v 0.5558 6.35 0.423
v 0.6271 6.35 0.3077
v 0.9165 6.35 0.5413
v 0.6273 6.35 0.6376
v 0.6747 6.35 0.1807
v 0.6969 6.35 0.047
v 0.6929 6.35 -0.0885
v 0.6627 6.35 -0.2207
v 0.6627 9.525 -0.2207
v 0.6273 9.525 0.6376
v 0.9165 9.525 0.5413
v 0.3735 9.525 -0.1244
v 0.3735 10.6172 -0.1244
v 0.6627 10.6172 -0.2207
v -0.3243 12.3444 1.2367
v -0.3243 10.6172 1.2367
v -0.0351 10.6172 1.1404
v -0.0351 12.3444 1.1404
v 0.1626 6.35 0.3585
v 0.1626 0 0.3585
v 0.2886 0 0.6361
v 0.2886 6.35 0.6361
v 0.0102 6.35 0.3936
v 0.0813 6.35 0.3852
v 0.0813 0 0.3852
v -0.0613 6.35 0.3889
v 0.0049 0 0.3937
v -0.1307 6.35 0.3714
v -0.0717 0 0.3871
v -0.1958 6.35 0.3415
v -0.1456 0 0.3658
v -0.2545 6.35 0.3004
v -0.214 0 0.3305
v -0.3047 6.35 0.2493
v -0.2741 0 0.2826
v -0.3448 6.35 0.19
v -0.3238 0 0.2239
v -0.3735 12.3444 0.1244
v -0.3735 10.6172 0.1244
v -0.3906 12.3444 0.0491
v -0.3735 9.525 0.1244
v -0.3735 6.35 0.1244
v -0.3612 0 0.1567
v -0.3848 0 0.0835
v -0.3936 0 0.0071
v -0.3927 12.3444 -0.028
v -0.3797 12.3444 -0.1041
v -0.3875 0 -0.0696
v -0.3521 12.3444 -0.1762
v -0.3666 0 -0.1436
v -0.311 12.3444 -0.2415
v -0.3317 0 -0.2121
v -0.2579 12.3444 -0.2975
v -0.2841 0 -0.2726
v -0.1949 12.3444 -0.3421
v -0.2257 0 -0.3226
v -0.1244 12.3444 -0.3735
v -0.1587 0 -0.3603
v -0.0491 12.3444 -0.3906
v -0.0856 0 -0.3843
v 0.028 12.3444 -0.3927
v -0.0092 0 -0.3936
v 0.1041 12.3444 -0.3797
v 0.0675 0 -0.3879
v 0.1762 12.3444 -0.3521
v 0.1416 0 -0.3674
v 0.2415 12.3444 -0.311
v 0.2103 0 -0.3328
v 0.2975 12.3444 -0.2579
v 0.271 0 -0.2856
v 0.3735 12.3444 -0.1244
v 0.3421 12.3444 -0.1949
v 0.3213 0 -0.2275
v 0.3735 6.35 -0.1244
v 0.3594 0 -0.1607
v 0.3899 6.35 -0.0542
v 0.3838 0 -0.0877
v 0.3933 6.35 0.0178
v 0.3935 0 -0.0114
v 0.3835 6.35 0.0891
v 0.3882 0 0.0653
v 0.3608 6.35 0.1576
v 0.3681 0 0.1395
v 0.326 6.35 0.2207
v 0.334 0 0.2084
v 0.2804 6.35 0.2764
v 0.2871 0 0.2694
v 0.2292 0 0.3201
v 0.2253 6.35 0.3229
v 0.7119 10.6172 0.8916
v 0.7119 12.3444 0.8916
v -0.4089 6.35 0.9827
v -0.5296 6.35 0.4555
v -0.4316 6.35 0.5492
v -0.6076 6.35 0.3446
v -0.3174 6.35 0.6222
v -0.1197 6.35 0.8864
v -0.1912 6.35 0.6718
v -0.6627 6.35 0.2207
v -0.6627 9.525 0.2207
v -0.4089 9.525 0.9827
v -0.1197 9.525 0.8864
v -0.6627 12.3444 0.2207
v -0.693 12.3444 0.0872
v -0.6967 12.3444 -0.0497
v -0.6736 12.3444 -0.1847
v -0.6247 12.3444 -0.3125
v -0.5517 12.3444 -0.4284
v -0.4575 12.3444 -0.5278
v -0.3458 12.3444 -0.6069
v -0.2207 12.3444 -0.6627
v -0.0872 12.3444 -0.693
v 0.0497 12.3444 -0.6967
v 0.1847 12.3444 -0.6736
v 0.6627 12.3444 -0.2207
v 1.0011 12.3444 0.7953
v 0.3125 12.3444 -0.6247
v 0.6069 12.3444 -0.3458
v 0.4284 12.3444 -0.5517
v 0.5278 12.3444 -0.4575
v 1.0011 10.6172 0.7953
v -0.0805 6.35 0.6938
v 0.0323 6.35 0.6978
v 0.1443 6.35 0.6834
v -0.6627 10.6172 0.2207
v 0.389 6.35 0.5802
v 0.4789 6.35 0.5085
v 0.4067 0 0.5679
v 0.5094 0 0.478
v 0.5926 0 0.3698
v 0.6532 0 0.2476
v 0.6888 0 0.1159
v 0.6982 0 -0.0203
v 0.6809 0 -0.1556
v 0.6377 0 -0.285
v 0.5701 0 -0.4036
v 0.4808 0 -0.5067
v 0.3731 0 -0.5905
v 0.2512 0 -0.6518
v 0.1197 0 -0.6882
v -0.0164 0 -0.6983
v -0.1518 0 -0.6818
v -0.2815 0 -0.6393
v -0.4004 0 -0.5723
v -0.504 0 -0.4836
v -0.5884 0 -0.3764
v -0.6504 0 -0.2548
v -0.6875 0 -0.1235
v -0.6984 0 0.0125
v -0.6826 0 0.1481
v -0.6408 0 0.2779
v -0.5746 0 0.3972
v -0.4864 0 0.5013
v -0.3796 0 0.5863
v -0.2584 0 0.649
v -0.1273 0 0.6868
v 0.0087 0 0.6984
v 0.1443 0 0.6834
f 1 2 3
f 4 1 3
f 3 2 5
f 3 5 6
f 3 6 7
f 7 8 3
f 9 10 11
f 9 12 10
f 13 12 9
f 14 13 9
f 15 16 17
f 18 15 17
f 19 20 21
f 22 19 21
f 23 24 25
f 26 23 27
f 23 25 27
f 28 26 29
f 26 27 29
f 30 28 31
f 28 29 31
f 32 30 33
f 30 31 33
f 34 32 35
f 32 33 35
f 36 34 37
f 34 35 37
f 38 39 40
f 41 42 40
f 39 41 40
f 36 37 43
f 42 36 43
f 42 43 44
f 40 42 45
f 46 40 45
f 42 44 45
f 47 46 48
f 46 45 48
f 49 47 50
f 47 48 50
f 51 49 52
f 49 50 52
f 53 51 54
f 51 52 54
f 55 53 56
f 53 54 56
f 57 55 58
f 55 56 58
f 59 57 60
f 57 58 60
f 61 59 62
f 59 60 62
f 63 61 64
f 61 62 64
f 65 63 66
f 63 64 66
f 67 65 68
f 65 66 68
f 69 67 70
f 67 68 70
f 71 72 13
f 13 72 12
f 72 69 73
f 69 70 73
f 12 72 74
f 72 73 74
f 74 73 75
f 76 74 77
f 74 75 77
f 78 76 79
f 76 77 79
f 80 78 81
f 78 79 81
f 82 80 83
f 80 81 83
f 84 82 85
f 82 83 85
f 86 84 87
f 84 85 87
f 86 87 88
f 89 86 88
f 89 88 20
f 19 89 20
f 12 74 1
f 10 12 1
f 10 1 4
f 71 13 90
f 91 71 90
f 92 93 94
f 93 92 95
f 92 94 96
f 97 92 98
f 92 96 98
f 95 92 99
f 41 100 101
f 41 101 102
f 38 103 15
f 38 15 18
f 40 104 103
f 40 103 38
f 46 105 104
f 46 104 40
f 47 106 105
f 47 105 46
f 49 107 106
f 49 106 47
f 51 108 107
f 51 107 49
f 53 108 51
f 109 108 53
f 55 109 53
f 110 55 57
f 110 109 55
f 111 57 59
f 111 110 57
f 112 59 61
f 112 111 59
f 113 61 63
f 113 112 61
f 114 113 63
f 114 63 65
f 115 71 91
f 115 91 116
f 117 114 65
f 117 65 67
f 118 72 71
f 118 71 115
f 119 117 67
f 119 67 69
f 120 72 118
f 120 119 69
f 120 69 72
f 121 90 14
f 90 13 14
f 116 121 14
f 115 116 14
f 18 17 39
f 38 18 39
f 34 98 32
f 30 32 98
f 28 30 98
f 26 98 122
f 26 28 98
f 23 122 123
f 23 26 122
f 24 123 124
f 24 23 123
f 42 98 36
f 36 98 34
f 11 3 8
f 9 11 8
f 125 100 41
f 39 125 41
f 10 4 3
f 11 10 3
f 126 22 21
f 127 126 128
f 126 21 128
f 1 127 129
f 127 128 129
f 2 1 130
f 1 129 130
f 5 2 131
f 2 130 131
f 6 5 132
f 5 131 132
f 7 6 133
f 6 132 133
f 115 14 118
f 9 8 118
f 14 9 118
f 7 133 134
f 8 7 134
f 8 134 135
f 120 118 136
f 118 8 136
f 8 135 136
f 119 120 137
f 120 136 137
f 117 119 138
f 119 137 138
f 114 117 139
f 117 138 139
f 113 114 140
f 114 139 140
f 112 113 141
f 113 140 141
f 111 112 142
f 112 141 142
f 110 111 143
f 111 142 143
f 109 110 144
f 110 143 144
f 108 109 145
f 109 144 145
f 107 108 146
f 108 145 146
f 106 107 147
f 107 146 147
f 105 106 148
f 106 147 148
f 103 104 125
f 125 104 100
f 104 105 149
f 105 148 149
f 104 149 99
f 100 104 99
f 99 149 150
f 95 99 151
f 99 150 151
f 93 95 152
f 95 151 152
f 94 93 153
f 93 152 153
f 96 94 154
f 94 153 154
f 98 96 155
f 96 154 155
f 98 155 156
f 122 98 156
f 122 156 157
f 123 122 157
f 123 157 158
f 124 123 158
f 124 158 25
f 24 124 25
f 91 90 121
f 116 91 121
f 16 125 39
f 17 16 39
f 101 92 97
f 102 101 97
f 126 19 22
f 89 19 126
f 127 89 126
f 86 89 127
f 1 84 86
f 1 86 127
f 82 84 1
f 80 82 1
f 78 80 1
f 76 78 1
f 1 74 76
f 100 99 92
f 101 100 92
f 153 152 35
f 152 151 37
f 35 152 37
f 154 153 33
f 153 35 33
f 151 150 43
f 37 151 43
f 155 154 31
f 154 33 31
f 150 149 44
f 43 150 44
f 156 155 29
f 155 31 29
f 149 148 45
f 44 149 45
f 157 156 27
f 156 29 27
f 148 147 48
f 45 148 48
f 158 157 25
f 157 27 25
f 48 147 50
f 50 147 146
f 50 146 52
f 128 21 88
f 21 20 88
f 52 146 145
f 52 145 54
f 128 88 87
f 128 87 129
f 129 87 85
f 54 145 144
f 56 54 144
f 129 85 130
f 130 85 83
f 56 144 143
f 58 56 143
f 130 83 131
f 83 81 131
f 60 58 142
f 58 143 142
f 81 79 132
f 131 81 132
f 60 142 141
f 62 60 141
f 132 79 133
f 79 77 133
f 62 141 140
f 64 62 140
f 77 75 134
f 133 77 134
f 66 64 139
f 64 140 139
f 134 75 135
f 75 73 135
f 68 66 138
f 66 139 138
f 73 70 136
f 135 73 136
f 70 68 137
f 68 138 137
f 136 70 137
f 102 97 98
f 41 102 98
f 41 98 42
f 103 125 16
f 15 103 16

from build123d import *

# Parameters (mm, degrees)
EXTRUDE_THIN1_DEPTH = 6.35
EXTRUDE_THIN2_DEPTH = 3.175
EXTRUDE_THIN3_DEPTH = 1.0922
EXTRUDE_THIN4_DEPTH = 1.7272


with BuildPart() as part:
    # Sketch1 → Extrude-Thin1 (new body)
    with BuildSketch(Plane(origin=(0, 0, 0), x_dir=(1, 0, 0), z_dir=(0, 1, 0))):
        with BuildLine():
            ThreePointArc((0.288556611, -0.636111101), (-0.217707256, 0.66370611), (0.144278305, -0.683436918))
            Line((0.144278305, -0.683436918), (0.081320499, -0.385209899))
            ThreePointArc((0.081320499, -0.385209899), (-0.122707726, 0.374088898), (0.162640999, -0.358535348))
            Line((0.162640999, -0.358535348), (0.288556611, -0.636111101))
        make_face()
    extrude(amount=EXTRUDE_THIN1_DEPTH)

    # Sketch2 → Extrude-Thin2 (add)
    with BuildSketch(Plane(origin=(0, 6.35, 0), x_dir=(1, 0, 0), z_dir=(0, 1, 0))):
        with BuildLine():
            Line((0.916497603, -0.541281881), (0.662710919, 0.220718119))
            ThreePointArc((0.662710919, 0.220718119), (-0.220718119, 0.662710919), (-0.662710919, -0.220718119))
            Line((-0.662710919, -0.220718119), (-0.408924235, -0.982718119))
            Line((-0.408924235, -0.982718119), (-0.119741288, -0.886404758))
            Line((-0.119741288, -0.886404758), (-0.373527972, -0.124404758))
            ThreePointArc((-0.373527972, -0.124404758), (-0.124404758, 0.373527972), (0.373527972, 0.124404758))
            Line((0.373527972, 0.124404758), (0.627314657, -0.637595242))
            Line((0.627314657, -0.637595242), (0.916497603, -0.541281881))
        make_face()
    extrude(amount=EXTRUDE_THIN2_DEPTH)

    # Sketch3 → Extrude-Thin3 (add)
    with BuildSketch(Plane(origin=(0, 9.525, 0), x_dir=(1, 0, 0), z_dir=(0, 1, 0))):
        with BuildLine():
            ThreePointArc((0.662710919, 0.220718119), (-0.220718119, 0.662710919), (-0.662710919, -0.220718119))
            Line((-0.662710919, -0.220718119), (-0.373527972, -0.124404758))
            ThreePointArc((-0.373527972, -0.124404758), (-0.124404758, 0.373527972), (0.373527972, 0.124404758))
            Line((0.373527972, 0.124404758), (0.662710919, 0.220718119))
        make_face()
    extrude(amount=EXTRUDE_THIN3_DEPTH)

    # Sketch4 → Extrude-Thin4 (add)
    with BuildSketch(Plane(origin=(0, 10.6172, 0), x_dir=(1, 0, 0), z_dir=(0, 1, 0))):
        with BuildLine():
            Line((1.001093165, -0.795281881), (0.662710919, 0.220718119))
            ThreePointArc((0.662710919, 0.220718119), (-0.220718119, 0.662710919), (-0.662710919, -0.220718119))
            Line((-0.662710919, -0.220718119), (-0.324328673, -1.236718119))
            Line((-0.324328673, -1.236718119), (-0.035145727, -1.140404758))
            Line((-0.035145727, -1.140404758), (-0.373527972, -0.124404758))
            ThreePointArc((-0.373527972, -0.124404758), (-0.124404758, 0.373527972), (0.373527972, 0.124404758))
            Line((0.373527972, 0.124404758), (0.711910218, -0.891595242))
            Line((0.711910218, -0.891595242), (1.001093165, -0.795281881))
        make_face()
    extrude(amount=EXTRUDE_THIN4_DEPTH)


solid = part.part
